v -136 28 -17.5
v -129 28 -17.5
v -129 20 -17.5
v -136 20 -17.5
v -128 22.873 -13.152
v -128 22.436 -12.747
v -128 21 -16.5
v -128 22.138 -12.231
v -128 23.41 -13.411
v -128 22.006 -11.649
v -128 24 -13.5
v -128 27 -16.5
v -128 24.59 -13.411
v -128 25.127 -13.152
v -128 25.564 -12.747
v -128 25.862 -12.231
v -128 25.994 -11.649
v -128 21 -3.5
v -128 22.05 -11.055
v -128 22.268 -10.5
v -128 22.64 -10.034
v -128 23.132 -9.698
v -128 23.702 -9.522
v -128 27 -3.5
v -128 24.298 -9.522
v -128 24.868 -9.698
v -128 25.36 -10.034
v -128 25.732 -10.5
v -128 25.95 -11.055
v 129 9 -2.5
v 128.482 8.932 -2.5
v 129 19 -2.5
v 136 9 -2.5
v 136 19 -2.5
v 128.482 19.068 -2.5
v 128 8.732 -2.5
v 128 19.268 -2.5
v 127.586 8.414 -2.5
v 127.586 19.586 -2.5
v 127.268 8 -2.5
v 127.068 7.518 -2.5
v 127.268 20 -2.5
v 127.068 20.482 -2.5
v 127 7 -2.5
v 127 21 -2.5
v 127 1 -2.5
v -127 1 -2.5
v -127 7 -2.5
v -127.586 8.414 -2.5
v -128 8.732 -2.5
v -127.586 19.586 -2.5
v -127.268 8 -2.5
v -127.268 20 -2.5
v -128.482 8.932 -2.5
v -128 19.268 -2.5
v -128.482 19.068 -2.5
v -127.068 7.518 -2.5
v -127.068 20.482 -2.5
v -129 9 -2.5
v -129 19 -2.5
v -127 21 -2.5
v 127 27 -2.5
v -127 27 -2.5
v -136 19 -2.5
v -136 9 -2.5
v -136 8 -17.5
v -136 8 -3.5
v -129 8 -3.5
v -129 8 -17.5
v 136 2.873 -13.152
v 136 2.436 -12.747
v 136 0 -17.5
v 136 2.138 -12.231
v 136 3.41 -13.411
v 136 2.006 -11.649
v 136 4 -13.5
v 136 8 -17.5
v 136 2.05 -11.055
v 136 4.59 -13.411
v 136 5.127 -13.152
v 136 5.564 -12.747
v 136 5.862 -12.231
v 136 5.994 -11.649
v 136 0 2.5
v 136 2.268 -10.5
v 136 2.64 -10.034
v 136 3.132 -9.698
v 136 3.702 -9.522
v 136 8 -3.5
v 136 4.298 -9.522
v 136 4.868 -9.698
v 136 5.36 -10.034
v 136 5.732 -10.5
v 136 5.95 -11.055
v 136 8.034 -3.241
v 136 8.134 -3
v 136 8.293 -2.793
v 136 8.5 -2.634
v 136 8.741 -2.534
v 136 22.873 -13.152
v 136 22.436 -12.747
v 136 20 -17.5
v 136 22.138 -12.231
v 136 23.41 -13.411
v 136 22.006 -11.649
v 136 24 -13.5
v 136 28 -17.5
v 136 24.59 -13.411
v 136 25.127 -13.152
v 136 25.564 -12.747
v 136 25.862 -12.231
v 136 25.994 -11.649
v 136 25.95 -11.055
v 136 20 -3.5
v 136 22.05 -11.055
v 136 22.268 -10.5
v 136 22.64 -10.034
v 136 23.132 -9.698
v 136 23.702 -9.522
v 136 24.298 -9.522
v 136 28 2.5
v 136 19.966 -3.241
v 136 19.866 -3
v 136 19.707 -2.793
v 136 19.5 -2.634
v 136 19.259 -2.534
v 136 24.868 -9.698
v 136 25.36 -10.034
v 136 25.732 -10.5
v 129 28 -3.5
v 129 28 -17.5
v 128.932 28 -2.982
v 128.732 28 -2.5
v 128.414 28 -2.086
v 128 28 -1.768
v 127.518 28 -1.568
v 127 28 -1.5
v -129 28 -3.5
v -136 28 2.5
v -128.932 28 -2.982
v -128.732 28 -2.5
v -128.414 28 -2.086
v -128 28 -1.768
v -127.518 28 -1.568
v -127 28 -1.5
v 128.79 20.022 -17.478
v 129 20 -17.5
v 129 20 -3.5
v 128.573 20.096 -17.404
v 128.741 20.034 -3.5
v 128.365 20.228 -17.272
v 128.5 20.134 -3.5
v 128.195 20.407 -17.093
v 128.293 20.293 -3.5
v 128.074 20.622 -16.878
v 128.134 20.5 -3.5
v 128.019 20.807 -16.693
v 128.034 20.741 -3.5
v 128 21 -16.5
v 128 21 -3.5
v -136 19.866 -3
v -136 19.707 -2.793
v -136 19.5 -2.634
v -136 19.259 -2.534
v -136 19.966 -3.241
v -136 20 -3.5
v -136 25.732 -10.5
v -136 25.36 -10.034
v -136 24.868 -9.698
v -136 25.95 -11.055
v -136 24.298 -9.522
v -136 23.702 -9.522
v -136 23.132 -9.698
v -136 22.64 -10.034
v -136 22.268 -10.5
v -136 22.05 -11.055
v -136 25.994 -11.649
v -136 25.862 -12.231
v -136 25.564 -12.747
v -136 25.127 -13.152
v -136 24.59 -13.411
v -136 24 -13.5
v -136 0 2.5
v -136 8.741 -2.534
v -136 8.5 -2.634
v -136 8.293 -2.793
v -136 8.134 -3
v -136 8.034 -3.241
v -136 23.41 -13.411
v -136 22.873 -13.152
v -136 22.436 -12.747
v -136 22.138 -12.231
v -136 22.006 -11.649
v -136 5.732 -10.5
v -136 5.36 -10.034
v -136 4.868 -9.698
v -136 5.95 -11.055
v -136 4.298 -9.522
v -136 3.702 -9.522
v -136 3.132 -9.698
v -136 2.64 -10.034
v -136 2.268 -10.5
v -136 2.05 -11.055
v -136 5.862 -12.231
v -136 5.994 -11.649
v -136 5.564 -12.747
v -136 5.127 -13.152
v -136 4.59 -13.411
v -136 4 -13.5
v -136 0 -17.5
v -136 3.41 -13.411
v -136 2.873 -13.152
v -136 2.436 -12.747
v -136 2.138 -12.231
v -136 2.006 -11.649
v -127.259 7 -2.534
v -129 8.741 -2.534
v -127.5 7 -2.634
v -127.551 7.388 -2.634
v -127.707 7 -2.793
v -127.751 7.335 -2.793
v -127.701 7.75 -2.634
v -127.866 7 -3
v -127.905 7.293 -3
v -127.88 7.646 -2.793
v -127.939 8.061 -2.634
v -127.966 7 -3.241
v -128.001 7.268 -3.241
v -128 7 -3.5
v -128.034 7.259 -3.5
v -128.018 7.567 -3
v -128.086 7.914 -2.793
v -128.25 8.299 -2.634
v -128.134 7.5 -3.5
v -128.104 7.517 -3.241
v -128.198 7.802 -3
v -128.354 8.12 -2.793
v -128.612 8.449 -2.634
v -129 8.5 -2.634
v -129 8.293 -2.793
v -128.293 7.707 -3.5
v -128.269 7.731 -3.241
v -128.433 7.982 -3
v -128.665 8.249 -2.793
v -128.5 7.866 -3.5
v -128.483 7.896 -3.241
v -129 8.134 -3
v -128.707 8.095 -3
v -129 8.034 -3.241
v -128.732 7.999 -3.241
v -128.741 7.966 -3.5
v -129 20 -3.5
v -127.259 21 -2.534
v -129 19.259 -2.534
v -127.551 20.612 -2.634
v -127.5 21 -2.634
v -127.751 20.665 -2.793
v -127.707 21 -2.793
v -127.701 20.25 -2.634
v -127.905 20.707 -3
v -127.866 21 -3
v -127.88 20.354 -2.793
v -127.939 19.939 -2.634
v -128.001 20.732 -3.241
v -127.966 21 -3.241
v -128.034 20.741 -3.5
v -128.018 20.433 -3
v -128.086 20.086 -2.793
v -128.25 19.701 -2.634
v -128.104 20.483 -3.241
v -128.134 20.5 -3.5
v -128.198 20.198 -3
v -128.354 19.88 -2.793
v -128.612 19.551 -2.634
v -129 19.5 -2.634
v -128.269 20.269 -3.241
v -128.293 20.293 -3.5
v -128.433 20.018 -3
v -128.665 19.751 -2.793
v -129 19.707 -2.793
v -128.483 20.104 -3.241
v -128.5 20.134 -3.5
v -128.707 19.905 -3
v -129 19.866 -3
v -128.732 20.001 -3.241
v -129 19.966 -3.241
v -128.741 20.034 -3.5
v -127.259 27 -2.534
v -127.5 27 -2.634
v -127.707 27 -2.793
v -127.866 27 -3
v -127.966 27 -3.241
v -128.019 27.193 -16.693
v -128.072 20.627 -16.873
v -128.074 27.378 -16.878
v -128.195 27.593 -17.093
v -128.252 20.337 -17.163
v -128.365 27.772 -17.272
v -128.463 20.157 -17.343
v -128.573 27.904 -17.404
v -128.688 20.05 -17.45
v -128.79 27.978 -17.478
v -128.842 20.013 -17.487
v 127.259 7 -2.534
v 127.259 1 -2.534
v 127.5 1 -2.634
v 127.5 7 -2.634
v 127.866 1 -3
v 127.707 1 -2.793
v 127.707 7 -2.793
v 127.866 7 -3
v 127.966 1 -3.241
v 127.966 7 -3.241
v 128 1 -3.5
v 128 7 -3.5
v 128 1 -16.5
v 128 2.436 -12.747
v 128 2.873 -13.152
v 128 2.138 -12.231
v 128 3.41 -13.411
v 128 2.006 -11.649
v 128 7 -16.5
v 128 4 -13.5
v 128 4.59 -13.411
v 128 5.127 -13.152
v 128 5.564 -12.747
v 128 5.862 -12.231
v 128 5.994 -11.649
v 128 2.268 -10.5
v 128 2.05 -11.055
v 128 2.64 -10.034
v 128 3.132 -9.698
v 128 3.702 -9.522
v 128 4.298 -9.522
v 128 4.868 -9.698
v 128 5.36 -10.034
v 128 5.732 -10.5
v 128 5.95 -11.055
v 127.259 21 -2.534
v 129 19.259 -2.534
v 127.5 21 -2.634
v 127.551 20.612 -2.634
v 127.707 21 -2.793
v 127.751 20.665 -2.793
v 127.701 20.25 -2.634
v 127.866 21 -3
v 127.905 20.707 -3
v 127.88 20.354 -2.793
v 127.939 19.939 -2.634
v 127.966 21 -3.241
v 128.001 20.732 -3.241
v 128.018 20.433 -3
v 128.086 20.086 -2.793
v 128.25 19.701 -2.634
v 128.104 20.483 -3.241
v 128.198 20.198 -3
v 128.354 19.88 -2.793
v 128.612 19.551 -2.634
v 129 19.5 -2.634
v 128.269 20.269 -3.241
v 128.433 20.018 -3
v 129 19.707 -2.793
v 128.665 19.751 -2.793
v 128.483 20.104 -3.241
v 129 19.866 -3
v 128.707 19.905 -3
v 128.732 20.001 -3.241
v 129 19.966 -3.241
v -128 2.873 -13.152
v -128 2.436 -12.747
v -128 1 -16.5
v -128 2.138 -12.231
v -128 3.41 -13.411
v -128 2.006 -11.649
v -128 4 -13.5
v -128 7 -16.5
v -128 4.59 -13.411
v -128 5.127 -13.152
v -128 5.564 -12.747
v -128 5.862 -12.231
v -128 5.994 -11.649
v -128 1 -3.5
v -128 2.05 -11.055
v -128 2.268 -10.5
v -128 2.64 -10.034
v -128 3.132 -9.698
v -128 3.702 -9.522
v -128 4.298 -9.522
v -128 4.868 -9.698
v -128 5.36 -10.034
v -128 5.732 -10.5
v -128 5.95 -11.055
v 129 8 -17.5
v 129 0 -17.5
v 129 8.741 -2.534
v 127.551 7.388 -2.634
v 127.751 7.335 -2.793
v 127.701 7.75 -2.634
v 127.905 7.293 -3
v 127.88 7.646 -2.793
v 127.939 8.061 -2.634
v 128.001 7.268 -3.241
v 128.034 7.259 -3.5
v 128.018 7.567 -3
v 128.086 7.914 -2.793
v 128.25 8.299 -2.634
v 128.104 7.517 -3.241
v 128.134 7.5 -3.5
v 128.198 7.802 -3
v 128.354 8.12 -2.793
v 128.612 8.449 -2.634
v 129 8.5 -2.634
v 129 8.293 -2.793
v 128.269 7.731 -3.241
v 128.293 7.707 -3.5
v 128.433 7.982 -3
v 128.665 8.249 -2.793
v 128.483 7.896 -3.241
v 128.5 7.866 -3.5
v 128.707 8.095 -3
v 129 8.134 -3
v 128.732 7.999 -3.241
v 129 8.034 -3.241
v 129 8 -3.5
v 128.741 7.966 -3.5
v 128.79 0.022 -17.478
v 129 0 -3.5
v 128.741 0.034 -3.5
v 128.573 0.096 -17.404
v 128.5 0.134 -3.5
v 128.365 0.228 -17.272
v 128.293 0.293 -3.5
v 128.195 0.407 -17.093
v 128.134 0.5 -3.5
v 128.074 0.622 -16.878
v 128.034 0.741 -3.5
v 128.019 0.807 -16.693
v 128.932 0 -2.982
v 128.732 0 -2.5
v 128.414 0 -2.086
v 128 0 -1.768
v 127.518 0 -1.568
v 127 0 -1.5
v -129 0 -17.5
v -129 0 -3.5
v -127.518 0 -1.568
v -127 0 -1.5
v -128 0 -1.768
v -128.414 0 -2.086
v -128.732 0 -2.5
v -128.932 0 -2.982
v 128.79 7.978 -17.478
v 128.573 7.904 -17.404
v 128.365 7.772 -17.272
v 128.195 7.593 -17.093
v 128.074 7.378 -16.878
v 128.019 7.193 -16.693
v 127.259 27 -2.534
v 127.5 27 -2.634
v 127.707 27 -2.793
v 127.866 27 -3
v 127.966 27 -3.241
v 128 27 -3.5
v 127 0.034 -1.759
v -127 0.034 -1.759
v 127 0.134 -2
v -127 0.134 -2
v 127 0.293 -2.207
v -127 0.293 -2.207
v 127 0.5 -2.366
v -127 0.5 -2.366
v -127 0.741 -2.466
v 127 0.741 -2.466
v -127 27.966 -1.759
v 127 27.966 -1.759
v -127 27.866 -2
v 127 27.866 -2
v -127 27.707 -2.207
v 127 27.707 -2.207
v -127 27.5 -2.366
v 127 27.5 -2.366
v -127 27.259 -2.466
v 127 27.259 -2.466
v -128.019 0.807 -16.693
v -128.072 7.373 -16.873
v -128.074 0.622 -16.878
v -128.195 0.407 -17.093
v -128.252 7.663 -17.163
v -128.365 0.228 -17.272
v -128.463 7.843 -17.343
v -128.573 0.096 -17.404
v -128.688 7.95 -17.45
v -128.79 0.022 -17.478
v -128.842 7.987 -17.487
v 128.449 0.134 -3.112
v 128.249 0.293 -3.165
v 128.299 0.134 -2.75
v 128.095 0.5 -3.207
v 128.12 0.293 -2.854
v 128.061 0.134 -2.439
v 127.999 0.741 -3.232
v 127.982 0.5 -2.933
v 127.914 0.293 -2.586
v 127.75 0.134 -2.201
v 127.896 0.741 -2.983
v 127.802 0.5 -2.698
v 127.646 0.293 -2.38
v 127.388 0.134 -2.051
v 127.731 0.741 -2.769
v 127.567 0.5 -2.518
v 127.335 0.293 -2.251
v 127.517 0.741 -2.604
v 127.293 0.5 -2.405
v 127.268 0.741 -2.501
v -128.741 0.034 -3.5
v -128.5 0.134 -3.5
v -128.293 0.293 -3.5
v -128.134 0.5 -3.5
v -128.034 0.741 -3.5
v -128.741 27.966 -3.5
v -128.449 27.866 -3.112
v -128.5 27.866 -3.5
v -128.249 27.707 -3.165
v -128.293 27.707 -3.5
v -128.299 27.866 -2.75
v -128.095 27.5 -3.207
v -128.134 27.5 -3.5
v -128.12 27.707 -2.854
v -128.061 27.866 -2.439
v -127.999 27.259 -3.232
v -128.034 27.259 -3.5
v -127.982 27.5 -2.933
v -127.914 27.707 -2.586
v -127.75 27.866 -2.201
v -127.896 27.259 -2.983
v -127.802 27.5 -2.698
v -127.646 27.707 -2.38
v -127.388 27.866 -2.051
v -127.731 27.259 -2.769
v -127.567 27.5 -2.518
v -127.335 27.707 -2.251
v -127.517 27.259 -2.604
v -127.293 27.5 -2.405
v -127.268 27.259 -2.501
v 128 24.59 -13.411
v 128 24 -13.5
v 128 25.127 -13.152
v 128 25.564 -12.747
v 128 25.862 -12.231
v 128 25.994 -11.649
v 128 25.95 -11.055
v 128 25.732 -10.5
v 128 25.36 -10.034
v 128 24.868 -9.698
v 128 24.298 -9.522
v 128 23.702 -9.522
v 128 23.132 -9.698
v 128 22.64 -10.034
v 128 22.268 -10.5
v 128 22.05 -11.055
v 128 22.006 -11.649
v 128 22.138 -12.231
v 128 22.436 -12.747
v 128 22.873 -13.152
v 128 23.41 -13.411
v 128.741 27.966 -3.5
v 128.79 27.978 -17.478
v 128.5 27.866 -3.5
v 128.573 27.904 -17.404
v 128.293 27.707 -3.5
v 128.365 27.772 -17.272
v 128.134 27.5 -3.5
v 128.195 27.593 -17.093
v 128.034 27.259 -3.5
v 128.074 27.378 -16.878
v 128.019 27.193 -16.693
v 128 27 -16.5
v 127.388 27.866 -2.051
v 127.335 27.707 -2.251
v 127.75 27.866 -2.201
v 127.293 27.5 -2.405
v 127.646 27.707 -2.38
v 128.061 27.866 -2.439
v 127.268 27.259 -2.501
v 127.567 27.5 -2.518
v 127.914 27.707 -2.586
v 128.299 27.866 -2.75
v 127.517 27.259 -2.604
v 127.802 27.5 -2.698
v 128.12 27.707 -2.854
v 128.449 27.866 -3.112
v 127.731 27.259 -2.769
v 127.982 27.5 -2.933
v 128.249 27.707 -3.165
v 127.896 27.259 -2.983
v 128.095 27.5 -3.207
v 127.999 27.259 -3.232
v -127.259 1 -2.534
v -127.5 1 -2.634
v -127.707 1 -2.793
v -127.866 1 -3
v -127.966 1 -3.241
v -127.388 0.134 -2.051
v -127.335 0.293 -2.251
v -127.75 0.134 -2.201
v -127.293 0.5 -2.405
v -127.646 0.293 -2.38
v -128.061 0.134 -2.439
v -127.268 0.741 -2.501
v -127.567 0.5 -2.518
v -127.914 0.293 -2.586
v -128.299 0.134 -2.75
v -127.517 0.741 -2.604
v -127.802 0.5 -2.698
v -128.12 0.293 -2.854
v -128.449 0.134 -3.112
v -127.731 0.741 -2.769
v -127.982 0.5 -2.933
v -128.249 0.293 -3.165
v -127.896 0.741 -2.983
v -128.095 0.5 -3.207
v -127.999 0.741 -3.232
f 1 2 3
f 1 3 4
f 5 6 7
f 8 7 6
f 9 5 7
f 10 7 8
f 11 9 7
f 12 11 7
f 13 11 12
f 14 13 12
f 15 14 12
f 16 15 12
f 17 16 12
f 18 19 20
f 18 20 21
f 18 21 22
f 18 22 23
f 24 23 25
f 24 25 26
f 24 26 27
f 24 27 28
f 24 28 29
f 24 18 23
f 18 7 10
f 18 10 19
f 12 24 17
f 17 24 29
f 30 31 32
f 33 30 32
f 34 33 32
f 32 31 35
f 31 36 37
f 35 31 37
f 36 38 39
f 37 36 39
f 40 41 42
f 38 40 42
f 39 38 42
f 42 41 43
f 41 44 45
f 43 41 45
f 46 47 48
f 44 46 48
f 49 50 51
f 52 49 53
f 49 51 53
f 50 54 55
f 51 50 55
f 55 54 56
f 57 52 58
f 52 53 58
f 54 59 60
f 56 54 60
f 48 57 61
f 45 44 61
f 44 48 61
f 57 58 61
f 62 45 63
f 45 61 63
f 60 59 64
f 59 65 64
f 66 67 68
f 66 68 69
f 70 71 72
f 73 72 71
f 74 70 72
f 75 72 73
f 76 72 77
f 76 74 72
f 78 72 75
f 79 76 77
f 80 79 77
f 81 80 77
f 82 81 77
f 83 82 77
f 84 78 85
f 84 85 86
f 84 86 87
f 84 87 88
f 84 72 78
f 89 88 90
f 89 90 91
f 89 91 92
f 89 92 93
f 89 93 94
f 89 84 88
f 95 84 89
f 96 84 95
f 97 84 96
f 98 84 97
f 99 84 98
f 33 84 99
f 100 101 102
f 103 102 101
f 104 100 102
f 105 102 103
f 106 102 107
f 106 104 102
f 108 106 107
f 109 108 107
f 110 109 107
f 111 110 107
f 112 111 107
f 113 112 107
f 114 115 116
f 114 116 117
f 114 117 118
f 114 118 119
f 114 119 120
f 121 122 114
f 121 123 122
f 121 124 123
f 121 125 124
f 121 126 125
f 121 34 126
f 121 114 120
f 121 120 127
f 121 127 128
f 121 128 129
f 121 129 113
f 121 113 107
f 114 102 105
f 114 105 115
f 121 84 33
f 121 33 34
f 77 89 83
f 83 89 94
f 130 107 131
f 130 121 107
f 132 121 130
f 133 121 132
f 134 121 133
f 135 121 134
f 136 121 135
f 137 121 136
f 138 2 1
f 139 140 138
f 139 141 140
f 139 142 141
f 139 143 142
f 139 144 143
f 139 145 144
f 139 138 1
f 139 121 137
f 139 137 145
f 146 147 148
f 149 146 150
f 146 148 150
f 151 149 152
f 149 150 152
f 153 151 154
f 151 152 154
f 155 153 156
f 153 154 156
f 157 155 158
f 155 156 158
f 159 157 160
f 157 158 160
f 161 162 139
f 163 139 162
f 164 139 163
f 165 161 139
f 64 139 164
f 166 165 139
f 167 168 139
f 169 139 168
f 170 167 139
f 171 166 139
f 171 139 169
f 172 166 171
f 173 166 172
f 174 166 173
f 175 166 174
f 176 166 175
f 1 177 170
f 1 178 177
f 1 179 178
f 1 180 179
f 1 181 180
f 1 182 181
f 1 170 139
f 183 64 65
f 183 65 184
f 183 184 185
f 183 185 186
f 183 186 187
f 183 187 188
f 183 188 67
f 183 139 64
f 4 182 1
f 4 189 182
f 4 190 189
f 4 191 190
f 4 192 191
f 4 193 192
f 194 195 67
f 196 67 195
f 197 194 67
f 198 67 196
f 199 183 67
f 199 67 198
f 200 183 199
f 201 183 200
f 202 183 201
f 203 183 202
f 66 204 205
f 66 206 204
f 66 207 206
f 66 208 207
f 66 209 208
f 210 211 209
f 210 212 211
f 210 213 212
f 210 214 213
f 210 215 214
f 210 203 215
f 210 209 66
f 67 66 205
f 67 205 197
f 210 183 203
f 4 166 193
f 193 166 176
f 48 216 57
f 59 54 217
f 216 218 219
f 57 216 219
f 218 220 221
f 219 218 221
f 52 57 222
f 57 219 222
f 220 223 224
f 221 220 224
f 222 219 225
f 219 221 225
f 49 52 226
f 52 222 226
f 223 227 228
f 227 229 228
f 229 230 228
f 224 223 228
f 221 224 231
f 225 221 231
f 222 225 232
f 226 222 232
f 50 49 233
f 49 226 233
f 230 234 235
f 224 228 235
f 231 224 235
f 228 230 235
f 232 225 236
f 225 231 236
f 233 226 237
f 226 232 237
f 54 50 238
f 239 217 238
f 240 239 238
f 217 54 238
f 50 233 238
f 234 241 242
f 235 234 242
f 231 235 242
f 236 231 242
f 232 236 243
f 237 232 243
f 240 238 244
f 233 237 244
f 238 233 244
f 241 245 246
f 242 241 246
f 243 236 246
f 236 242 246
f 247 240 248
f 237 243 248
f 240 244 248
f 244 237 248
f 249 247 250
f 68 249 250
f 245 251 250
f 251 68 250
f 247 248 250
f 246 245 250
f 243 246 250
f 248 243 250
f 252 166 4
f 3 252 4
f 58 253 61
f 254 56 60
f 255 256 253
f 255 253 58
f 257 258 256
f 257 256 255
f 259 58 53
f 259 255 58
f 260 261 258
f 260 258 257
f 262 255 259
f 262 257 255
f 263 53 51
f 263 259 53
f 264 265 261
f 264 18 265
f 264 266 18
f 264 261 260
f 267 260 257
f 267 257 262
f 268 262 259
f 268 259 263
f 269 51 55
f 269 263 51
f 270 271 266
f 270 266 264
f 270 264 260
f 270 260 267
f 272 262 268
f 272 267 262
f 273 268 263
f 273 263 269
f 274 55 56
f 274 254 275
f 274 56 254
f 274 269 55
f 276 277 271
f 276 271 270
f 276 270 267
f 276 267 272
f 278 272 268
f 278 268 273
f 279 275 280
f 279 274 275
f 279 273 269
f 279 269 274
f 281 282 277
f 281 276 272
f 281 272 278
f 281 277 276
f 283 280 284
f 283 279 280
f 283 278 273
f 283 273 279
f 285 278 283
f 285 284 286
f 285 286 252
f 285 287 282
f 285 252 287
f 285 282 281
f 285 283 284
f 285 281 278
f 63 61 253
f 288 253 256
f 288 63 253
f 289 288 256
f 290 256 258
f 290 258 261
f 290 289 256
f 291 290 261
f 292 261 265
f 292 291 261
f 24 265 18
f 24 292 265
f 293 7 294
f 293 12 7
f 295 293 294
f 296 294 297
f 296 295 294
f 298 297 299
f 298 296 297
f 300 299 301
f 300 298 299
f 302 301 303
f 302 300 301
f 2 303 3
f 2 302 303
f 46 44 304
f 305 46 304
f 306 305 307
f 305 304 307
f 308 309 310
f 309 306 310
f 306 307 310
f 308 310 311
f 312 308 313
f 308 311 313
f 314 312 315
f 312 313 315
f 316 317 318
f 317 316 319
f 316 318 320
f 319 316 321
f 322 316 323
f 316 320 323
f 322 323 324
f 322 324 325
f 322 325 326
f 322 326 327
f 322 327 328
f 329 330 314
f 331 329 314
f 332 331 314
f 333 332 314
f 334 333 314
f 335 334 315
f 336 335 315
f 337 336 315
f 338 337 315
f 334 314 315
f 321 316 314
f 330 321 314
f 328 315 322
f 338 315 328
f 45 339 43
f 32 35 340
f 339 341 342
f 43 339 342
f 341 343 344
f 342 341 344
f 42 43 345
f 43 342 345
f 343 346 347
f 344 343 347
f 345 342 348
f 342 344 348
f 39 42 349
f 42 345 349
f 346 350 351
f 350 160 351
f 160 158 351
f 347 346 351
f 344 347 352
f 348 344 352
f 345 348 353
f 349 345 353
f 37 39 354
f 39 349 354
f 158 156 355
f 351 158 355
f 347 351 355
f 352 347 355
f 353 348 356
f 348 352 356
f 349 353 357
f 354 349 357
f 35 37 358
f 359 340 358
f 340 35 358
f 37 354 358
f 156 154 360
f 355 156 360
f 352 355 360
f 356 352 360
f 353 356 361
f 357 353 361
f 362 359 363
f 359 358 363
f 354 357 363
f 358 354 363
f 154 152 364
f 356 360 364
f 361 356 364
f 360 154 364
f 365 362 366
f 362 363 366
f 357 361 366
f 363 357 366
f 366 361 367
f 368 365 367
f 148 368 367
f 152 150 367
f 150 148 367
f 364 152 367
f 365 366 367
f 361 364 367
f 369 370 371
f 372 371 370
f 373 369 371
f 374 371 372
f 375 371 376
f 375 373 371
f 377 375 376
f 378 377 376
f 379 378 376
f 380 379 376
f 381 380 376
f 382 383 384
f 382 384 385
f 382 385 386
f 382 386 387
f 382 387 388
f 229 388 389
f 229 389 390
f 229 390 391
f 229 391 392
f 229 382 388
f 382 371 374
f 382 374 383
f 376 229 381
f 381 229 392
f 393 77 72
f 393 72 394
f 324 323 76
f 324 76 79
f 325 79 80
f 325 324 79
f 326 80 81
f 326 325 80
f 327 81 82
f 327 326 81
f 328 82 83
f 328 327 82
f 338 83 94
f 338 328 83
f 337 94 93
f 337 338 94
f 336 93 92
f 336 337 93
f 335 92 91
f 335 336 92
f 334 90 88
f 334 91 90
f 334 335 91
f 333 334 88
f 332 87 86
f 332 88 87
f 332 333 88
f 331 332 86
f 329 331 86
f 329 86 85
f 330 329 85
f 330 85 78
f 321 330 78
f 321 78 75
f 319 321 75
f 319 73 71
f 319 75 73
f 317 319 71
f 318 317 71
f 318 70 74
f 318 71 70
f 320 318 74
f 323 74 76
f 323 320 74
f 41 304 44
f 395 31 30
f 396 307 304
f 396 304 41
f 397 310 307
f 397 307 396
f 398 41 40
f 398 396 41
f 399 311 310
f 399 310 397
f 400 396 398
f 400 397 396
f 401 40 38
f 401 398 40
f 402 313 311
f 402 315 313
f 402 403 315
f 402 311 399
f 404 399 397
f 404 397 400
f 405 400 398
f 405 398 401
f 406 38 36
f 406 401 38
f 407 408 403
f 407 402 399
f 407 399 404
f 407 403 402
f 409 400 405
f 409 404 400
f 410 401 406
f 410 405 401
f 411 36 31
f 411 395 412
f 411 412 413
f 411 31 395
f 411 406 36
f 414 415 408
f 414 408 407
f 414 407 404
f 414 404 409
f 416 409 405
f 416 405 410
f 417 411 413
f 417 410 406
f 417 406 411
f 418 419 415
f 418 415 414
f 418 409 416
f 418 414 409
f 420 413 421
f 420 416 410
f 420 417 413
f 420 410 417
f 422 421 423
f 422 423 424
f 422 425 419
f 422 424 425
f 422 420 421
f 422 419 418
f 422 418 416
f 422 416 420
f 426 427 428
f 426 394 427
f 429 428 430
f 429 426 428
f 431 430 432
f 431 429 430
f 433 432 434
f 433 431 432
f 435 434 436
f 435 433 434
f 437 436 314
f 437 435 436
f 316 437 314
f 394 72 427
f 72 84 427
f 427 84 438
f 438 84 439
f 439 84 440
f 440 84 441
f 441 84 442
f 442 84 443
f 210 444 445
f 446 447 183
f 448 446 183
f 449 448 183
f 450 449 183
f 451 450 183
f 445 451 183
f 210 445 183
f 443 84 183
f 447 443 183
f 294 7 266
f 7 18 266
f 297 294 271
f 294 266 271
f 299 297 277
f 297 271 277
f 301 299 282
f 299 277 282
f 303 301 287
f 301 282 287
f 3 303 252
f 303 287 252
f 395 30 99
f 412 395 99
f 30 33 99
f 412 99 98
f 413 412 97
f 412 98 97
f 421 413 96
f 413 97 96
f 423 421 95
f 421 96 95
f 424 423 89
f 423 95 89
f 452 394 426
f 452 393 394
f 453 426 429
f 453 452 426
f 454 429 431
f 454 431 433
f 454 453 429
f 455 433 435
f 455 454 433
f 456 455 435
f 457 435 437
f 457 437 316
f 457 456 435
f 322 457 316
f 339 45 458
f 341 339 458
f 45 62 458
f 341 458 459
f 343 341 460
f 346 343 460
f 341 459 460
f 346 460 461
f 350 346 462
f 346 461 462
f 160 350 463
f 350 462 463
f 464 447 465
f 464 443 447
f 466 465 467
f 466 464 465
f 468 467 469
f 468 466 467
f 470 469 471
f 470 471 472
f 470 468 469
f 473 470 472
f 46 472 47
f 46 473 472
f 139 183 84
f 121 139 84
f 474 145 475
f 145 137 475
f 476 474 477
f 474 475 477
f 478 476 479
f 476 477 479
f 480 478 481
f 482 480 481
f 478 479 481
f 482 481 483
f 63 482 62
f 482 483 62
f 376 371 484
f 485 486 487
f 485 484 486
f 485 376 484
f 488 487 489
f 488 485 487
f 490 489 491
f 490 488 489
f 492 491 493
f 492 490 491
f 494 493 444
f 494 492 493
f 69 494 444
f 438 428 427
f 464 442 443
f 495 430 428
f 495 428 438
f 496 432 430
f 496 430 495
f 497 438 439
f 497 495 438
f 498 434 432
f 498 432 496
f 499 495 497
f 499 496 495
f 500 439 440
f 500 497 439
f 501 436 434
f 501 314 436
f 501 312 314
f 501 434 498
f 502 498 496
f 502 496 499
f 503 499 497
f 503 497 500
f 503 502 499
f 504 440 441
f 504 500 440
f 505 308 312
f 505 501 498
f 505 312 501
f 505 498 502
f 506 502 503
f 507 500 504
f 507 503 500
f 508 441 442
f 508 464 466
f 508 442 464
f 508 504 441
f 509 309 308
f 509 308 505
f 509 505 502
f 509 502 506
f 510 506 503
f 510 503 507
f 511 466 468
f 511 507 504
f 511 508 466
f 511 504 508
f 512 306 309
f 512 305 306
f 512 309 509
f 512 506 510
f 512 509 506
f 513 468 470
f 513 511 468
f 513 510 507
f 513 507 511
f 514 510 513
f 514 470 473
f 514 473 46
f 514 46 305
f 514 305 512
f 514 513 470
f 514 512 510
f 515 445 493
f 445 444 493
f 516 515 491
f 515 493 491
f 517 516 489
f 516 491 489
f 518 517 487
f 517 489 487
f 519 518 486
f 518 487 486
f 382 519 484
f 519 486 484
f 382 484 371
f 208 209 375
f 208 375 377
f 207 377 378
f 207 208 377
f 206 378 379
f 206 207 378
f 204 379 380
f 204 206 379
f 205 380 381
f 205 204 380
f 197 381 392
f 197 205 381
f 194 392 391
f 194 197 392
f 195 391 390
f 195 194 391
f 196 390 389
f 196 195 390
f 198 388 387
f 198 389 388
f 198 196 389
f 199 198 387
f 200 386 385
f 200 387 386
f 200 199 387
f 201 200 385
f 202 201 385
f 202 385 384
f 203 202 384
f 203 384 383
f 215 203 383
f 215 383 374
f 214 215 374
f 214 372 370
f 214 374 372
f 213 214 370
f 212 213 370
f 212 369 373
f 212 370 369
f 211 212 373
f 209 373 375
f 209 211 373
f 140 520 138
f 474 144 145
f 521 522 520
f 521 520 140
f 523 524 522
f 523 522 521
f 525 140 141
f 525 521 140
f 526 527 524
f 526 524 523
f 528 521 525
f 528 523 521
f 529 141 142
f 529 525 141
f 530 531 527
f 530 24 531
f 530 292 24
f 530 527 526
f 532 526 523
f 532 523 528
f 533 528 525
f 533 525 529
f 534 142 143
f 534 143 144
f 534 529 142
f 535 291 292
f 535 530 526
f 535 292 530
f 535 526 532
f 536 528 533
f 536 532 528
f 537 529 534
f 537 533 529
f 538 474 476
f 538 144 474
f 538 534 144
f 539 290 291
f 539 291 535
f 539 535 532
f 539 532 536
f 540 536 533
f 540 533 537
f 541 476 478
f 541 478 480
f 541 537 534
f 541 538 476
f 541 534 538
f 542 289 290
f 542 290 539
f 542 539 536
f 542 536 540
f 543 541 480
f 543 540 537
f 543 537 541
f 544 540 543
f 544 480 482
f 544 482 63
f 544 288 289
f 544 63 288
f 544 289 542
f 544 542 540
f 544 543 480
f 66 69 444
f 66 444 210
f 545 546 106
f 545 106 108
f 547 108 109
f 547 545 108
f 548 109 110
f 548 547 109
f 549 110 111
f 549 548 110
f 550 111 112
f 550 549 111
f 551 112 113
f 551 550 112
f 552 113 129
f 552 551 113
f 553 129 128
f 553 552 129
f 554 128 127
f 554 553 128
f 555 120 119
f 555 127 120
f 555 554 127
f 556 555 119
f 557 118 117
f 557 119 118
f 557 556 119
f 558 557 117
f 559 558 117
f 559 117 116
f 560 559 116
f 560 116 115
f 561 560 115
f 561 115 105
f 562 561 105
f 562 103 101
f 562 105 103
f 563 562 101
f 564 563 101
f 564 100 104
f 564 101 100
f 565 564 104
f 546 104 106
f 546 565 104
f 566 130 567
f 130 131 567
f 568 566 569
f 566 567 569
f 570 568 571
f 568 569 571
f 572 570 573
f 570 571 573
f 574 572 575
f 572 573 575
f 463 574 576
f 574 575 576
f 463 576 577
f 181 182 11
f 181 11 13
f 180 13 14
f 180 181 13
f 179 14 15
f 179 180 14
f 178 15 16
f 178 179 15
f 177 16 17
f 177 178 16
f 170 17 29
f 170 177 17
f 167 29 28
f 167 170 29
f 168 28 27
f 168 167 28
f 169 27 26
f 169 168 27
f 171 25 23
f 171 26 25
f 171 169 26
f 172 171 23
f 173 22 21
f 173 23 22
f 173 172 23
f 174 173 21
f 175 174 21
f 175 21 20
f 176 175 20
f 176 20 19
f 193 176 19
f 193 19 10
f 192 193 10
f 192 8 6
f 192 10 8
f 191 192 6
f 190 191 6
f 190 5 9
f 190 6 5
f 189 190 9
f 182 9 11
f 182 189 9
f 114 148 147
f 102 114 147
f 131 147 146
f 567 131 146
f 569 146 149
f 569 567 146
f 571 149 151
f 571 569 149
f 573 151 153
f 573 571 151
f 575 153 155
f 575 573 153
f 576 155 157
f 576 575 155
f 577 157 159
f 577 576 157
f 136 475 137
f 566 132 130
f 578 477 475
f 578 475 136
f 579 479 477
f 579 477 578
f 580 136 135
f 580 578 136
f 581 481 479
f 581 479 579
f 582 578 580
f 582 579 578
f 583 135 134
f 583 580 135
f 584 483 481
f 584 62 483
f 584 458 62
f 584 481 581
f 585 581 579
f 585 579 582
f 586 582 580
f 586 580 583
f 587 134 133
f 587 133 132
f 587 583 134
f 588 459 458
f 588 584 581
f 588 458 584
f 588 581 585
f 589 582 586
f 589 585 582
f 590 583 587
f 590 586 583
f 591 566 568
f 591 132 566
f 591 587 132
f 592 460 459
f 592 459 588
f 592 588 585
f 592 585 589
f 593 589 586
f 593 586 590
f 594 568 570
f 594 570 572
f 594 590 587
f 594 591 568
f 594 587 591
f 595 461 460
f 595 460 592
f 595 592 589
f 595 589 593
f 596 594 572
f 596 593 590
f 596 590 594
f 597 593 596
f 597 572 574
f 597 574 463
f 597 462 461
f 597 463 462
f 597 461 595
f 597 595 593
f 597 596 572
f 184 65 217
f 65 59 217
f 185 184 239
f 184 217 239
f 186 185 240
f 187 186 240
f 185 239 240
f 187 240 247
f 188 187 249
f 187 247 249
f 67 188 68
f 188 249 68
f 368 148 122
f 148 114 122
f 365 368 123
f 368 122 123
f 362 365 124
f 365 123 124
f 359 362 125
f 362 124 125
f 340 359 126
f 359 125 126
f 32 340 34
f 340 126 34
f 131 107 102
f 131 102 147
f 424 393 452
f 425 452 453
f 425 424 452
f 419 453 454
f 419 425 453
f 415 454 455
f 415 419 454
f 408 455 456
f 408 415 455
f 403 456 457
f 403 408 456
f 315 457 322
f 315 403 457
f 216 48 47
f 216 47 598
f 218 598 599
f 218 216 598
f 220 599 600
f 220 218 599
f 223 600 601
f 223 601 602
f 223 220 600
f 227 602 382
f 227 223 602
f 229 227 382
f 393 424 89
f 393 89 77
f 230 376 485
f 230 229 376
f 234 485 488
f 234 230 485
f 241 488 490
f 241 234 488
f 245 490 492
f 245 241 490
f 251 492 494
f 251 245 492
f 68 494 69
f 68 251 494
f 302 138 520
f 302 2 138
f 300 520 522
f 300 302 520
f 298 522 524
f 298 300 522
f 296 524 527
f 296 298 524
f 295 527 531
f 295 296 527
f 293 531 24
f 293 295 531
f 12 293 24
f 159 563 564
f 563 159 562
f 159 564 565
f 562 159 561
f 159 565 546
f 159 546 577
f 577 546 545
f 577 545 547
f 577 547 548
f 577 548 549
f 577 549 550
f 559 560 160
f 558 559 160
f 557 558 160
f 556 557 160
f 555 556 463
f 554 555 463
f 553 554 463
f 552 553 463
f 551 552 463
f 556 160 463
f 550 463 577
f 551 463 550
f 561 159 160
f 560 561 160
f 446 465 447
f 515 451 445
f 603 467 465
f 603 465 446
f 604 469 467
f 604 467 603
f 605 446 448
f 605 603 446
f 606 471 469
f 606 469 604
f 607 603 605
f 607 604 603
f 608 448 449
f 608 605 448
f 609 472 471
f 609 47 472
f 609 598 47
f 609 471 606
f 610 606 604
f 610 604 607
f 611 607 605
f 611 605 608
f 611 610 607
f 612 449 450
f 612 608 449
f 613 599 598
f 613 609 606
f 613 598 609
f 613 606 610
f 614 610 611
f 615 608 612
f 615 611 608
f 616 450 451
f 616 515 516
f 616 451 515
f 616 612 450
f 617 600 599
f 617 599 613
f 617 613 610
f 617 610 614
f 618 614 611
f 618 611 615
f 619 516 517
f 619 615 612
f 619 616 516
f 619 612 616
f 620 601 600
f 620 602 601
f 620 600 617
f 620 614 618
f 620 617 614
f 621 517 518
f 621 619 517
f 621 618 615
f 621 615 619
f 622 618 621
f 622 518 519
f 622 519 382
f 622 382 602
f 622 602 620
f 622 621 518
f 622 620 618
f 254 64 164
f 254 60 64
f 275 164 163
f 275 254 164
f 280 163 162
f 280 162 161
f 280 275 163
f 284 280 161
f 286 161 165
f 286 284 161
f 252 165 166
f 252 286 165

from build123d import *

# Parameters (mm, degrees)
SKETCH1_W               = 272
SKETCH1_H               = 5
BOSS_EXTRUDE1_DEPTH     = 28
SKETCH2_W               = 8
SKETCH2_H               = 28
BOSS_EXTRUDE2_DEPTH     = 15
CUT_EXTRUDE1_DEPTH      = 274.996806551
CUT_EXTRUDE1_DEPTH_BACK = 274.996806551
SKETCH3_W               = 15
SKETCH3_H               = 12
FILLET1_R               = 1
CUT_EXTRUDE2_DEPTH      = 274.996806551
CUT_EXTRUDE2_DEPTH_BACK = 274.996806551
SKETCH4_R               = 2


with BuildPart() as part:
    # Sketch1 → Boss-Extrude1 (new body)
    with BuildSketch(Plane(origin=(0, 0, 0), x_dir=(1, 0, 0), z_dir=(0, 1, 0))):
        Rectangle(SKETCH1_W, SKETCH1_H)
    extrude(amount=BOSS_EXTRUDE1_DEPTH)

    # Sketch2 → Boss-Extrude2 (add)
    with BuildSketch(Plane(origin=(0, 0, -2.5), x_dir=(-1, 0, 0), z_dir=(0, 0, -1))):
        with Locations((-132, 14)):
            Rectangle(SKETCH2_W, SKETCH2_H)
        with Locations((132, 14)):
            Rectangle(SKETCH2_W, SKETCH2_H)
    extrude(amount=BOSS_EXTRUDE2_DEPTH)

    # Sketch3 → Cut-Extrude1 (cut, two sides: drawn at the far end of the back side and taken through both)
    with BuildSketch(Plane(origin=(136, 0, 0), x_dir=(0, 0, -1), z_dir=(1, 0, 0)).offset(-CUT_EXTRUDE1_DEPTH_BACK)):
        with Locations((10, 14)):
            Rectangle(SKETCH3_W, SKETCH3_H)
    extrude(amount=CUT_EXTRUDE1_DEPTH + CUT_EXTRUDE1_DEPTH_BACK, mode=Mode.SUBTRACT)

    # Fillet1
    fillet1_edges = [part.edges().sort_by_distance(p)[0] for p in [
        (0, 0, -2.5),
        (0, 28, -2.5),
        (128, 4, -2.5),
        (128, 0, -10),
        (128, 28, -10),
        (128, 4, -17.5),
        (-128, 24, -2.5),
        (-128, 28, -10),
        (-128, 0, -10),
        (-128, 24, -17.5),
        (-128, 4, -17.5),
        (-128, 4, -2.5),
        (128, 24, -17.5),
        (128, 24, -2.5),
        (132, 8, -2.5),
        (-132, 8, -2.5),
        (132, 20, -2.5),
        (-132, 20, -2.5),
        (128, 8, -10),
        (-128, 8, -10),
        (128, 20, -10),
        (-128, 20, -10),
    ]]
    fillet(fillet1_edges, radius=FILLET1_R)

    # Sketch4 → Cut-Extrude2 (cut, two sides: drawn at the far end of the back side and taken through both)
    with BuildSketch(Plane(origin=(136, 0, 0), x_dir=(0, 0, -1), z_dir=(1, 0, 0)).offset(-CUT_EXTRUDE2_DEPTH_BACK)):
        with Locations((11.5, 24)):
            Circle(SKETCH4_R)
        with Locations((11.5, 4)):
            Circle(SKETCH4_R)
    extrude(amount=CUT_EXTRUDE2_DEPTH + CUT_EXTRUDE2_DEPTH_BACK, mode=Mode.SUBTRACT)


solid = part.part
